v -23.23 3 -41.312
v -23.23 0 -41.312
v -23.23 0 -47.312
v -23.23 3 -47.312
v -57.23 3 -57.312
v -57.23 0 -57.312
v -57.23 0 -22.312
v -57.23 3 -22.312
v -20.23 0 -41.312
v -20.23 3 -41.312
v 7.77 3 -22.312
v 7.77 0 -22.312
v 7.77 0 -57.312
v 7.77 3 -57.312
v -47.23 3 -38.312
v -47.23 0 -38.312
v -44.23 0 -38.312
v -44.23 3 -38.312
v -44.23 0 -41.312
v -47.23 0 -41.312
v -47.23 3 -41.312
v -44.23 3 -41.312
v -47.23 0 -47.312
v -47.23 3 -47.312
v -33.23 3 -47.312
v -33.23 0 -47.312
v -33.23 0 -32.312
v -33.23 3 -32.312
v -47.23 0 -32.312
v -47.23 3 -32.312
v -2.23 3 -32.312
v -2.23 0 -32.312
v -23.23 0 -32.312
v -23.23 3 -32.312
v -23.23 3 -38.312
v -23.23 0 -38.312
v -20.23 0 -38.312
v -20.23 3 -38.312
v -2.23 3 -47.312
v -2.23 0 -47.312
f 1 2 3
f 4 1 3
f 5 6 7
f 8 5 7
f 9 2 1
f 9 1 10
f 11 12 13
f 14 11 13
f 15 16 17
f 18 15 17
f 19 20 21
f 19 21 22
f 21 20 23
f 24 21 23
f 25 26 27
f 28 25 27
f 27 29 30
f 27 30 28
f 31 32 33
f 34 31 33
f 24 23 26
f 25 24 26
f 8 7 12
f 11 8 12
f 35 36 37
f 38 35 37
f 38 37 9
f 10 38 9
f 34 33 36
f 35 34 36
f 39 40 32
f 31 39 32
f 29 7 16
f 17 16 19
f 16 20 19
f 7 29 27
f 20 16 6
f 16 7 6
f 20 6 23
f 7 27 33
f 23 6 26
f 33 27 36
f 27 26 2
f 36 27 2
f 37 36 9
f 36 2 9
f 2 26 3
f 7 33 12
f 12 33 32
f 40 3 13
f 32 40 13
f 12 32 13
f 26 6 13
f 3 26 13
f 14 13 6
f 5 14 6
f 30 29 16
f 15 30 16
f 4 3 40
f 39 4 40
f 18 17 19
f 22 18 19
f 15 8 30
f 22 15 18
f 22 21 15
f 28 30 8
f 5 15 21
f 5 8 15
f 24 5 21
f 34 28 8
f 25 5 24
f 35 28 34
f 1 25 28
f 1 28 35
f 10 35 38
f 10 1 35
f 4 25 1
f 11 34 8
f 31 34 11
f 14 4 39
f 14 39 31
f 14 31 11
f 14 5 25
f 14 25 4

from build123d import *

# Parameters (mm, degrees)
SKETCH1_W           = 3
SKETCH1_H           = 3
SKETCH1_W_2         = 14
SKETCH1_H_2         = 10
BOSS_EXTRUDE1_DEPTH = 3


with BuildPart() as part:
    # Sketch1 → Boss-Extrude1 (new body)
    with BuildSketch(Plane(origin=(0, 0, 0), x_dir=(1, 0, 0), z_dir=(0, 1, 0))):
        Polygon((-2.229716691, 32.311583722), (-23.229716691, 32.311583722), (-23.229716691, 22.311583722), (7.770283309, 22.311583722), (7.770283309, 57.311583722), (-23.229716691, 57.311583722), (-23.229716691, 47.311583722), (-2.229716691, 47.311583722), align=None)
        with Locations((-21.729716691, 39.811583722)):
            Rectangle(SKETCH1_W, SKETCH1_H)
        Polygon((-23.229716691, 32.311583722), (-23.229716691, 34.311583722), (-23.229716691, 38.311583722), (-33.229716691, 38.311583722), (-33.229716691, 32.311583722), (-33.229716691, 22.311583722), (-23.229716691, 22.311583722), align=None)
        Polygon((-33.229716691, 38.311583722), (-23.229716691, 38.311583722), (-23.229716691, 41.311583722), (-23.229716691, 45.311583722), (-23.229716691, 47.311583722), (-23.229716691, 57.311583722), (-33.229716691, 57.311583722), (-33.229716691, 47.311583722), align=None)
        with Locations((-40.229716691, 52.311583722)):
            Rectangle(SKETCH1_W_2, SKETCH1_H_2)
        with Locations((-40.229716691, 27.311583722)):
            Rectangle(SKETCH1_W_2, SKETCH1_H_2)
        Polygon((-47.229716691, 22.311583722), (-47.229716691, 32.311583722), (-47.229716691, 34.311583722), (-47.229716691, 38.311583722), (-57.229716691, 38.311583722), (-57.229716691, 22.311583722), align=None)
        Polygon((-47.229716691, 45.311583722), (-47.229716691, 47.311583722), (-47.229716691, 57.311583722), (-57.229716691, 57.311583722), (-57.229716691, 38.311583722), (-47.229716691, 38.311583722), (-47.229716691, 41.311583722), align=None)
        with Locations((-45.729716691, 39.811583722)):
            Rectangle(SKETCH1_W, SKETCH1_H)
    extrude(amount=BOSS_EXTRUDE1_DEPTH)


solid = part.part
